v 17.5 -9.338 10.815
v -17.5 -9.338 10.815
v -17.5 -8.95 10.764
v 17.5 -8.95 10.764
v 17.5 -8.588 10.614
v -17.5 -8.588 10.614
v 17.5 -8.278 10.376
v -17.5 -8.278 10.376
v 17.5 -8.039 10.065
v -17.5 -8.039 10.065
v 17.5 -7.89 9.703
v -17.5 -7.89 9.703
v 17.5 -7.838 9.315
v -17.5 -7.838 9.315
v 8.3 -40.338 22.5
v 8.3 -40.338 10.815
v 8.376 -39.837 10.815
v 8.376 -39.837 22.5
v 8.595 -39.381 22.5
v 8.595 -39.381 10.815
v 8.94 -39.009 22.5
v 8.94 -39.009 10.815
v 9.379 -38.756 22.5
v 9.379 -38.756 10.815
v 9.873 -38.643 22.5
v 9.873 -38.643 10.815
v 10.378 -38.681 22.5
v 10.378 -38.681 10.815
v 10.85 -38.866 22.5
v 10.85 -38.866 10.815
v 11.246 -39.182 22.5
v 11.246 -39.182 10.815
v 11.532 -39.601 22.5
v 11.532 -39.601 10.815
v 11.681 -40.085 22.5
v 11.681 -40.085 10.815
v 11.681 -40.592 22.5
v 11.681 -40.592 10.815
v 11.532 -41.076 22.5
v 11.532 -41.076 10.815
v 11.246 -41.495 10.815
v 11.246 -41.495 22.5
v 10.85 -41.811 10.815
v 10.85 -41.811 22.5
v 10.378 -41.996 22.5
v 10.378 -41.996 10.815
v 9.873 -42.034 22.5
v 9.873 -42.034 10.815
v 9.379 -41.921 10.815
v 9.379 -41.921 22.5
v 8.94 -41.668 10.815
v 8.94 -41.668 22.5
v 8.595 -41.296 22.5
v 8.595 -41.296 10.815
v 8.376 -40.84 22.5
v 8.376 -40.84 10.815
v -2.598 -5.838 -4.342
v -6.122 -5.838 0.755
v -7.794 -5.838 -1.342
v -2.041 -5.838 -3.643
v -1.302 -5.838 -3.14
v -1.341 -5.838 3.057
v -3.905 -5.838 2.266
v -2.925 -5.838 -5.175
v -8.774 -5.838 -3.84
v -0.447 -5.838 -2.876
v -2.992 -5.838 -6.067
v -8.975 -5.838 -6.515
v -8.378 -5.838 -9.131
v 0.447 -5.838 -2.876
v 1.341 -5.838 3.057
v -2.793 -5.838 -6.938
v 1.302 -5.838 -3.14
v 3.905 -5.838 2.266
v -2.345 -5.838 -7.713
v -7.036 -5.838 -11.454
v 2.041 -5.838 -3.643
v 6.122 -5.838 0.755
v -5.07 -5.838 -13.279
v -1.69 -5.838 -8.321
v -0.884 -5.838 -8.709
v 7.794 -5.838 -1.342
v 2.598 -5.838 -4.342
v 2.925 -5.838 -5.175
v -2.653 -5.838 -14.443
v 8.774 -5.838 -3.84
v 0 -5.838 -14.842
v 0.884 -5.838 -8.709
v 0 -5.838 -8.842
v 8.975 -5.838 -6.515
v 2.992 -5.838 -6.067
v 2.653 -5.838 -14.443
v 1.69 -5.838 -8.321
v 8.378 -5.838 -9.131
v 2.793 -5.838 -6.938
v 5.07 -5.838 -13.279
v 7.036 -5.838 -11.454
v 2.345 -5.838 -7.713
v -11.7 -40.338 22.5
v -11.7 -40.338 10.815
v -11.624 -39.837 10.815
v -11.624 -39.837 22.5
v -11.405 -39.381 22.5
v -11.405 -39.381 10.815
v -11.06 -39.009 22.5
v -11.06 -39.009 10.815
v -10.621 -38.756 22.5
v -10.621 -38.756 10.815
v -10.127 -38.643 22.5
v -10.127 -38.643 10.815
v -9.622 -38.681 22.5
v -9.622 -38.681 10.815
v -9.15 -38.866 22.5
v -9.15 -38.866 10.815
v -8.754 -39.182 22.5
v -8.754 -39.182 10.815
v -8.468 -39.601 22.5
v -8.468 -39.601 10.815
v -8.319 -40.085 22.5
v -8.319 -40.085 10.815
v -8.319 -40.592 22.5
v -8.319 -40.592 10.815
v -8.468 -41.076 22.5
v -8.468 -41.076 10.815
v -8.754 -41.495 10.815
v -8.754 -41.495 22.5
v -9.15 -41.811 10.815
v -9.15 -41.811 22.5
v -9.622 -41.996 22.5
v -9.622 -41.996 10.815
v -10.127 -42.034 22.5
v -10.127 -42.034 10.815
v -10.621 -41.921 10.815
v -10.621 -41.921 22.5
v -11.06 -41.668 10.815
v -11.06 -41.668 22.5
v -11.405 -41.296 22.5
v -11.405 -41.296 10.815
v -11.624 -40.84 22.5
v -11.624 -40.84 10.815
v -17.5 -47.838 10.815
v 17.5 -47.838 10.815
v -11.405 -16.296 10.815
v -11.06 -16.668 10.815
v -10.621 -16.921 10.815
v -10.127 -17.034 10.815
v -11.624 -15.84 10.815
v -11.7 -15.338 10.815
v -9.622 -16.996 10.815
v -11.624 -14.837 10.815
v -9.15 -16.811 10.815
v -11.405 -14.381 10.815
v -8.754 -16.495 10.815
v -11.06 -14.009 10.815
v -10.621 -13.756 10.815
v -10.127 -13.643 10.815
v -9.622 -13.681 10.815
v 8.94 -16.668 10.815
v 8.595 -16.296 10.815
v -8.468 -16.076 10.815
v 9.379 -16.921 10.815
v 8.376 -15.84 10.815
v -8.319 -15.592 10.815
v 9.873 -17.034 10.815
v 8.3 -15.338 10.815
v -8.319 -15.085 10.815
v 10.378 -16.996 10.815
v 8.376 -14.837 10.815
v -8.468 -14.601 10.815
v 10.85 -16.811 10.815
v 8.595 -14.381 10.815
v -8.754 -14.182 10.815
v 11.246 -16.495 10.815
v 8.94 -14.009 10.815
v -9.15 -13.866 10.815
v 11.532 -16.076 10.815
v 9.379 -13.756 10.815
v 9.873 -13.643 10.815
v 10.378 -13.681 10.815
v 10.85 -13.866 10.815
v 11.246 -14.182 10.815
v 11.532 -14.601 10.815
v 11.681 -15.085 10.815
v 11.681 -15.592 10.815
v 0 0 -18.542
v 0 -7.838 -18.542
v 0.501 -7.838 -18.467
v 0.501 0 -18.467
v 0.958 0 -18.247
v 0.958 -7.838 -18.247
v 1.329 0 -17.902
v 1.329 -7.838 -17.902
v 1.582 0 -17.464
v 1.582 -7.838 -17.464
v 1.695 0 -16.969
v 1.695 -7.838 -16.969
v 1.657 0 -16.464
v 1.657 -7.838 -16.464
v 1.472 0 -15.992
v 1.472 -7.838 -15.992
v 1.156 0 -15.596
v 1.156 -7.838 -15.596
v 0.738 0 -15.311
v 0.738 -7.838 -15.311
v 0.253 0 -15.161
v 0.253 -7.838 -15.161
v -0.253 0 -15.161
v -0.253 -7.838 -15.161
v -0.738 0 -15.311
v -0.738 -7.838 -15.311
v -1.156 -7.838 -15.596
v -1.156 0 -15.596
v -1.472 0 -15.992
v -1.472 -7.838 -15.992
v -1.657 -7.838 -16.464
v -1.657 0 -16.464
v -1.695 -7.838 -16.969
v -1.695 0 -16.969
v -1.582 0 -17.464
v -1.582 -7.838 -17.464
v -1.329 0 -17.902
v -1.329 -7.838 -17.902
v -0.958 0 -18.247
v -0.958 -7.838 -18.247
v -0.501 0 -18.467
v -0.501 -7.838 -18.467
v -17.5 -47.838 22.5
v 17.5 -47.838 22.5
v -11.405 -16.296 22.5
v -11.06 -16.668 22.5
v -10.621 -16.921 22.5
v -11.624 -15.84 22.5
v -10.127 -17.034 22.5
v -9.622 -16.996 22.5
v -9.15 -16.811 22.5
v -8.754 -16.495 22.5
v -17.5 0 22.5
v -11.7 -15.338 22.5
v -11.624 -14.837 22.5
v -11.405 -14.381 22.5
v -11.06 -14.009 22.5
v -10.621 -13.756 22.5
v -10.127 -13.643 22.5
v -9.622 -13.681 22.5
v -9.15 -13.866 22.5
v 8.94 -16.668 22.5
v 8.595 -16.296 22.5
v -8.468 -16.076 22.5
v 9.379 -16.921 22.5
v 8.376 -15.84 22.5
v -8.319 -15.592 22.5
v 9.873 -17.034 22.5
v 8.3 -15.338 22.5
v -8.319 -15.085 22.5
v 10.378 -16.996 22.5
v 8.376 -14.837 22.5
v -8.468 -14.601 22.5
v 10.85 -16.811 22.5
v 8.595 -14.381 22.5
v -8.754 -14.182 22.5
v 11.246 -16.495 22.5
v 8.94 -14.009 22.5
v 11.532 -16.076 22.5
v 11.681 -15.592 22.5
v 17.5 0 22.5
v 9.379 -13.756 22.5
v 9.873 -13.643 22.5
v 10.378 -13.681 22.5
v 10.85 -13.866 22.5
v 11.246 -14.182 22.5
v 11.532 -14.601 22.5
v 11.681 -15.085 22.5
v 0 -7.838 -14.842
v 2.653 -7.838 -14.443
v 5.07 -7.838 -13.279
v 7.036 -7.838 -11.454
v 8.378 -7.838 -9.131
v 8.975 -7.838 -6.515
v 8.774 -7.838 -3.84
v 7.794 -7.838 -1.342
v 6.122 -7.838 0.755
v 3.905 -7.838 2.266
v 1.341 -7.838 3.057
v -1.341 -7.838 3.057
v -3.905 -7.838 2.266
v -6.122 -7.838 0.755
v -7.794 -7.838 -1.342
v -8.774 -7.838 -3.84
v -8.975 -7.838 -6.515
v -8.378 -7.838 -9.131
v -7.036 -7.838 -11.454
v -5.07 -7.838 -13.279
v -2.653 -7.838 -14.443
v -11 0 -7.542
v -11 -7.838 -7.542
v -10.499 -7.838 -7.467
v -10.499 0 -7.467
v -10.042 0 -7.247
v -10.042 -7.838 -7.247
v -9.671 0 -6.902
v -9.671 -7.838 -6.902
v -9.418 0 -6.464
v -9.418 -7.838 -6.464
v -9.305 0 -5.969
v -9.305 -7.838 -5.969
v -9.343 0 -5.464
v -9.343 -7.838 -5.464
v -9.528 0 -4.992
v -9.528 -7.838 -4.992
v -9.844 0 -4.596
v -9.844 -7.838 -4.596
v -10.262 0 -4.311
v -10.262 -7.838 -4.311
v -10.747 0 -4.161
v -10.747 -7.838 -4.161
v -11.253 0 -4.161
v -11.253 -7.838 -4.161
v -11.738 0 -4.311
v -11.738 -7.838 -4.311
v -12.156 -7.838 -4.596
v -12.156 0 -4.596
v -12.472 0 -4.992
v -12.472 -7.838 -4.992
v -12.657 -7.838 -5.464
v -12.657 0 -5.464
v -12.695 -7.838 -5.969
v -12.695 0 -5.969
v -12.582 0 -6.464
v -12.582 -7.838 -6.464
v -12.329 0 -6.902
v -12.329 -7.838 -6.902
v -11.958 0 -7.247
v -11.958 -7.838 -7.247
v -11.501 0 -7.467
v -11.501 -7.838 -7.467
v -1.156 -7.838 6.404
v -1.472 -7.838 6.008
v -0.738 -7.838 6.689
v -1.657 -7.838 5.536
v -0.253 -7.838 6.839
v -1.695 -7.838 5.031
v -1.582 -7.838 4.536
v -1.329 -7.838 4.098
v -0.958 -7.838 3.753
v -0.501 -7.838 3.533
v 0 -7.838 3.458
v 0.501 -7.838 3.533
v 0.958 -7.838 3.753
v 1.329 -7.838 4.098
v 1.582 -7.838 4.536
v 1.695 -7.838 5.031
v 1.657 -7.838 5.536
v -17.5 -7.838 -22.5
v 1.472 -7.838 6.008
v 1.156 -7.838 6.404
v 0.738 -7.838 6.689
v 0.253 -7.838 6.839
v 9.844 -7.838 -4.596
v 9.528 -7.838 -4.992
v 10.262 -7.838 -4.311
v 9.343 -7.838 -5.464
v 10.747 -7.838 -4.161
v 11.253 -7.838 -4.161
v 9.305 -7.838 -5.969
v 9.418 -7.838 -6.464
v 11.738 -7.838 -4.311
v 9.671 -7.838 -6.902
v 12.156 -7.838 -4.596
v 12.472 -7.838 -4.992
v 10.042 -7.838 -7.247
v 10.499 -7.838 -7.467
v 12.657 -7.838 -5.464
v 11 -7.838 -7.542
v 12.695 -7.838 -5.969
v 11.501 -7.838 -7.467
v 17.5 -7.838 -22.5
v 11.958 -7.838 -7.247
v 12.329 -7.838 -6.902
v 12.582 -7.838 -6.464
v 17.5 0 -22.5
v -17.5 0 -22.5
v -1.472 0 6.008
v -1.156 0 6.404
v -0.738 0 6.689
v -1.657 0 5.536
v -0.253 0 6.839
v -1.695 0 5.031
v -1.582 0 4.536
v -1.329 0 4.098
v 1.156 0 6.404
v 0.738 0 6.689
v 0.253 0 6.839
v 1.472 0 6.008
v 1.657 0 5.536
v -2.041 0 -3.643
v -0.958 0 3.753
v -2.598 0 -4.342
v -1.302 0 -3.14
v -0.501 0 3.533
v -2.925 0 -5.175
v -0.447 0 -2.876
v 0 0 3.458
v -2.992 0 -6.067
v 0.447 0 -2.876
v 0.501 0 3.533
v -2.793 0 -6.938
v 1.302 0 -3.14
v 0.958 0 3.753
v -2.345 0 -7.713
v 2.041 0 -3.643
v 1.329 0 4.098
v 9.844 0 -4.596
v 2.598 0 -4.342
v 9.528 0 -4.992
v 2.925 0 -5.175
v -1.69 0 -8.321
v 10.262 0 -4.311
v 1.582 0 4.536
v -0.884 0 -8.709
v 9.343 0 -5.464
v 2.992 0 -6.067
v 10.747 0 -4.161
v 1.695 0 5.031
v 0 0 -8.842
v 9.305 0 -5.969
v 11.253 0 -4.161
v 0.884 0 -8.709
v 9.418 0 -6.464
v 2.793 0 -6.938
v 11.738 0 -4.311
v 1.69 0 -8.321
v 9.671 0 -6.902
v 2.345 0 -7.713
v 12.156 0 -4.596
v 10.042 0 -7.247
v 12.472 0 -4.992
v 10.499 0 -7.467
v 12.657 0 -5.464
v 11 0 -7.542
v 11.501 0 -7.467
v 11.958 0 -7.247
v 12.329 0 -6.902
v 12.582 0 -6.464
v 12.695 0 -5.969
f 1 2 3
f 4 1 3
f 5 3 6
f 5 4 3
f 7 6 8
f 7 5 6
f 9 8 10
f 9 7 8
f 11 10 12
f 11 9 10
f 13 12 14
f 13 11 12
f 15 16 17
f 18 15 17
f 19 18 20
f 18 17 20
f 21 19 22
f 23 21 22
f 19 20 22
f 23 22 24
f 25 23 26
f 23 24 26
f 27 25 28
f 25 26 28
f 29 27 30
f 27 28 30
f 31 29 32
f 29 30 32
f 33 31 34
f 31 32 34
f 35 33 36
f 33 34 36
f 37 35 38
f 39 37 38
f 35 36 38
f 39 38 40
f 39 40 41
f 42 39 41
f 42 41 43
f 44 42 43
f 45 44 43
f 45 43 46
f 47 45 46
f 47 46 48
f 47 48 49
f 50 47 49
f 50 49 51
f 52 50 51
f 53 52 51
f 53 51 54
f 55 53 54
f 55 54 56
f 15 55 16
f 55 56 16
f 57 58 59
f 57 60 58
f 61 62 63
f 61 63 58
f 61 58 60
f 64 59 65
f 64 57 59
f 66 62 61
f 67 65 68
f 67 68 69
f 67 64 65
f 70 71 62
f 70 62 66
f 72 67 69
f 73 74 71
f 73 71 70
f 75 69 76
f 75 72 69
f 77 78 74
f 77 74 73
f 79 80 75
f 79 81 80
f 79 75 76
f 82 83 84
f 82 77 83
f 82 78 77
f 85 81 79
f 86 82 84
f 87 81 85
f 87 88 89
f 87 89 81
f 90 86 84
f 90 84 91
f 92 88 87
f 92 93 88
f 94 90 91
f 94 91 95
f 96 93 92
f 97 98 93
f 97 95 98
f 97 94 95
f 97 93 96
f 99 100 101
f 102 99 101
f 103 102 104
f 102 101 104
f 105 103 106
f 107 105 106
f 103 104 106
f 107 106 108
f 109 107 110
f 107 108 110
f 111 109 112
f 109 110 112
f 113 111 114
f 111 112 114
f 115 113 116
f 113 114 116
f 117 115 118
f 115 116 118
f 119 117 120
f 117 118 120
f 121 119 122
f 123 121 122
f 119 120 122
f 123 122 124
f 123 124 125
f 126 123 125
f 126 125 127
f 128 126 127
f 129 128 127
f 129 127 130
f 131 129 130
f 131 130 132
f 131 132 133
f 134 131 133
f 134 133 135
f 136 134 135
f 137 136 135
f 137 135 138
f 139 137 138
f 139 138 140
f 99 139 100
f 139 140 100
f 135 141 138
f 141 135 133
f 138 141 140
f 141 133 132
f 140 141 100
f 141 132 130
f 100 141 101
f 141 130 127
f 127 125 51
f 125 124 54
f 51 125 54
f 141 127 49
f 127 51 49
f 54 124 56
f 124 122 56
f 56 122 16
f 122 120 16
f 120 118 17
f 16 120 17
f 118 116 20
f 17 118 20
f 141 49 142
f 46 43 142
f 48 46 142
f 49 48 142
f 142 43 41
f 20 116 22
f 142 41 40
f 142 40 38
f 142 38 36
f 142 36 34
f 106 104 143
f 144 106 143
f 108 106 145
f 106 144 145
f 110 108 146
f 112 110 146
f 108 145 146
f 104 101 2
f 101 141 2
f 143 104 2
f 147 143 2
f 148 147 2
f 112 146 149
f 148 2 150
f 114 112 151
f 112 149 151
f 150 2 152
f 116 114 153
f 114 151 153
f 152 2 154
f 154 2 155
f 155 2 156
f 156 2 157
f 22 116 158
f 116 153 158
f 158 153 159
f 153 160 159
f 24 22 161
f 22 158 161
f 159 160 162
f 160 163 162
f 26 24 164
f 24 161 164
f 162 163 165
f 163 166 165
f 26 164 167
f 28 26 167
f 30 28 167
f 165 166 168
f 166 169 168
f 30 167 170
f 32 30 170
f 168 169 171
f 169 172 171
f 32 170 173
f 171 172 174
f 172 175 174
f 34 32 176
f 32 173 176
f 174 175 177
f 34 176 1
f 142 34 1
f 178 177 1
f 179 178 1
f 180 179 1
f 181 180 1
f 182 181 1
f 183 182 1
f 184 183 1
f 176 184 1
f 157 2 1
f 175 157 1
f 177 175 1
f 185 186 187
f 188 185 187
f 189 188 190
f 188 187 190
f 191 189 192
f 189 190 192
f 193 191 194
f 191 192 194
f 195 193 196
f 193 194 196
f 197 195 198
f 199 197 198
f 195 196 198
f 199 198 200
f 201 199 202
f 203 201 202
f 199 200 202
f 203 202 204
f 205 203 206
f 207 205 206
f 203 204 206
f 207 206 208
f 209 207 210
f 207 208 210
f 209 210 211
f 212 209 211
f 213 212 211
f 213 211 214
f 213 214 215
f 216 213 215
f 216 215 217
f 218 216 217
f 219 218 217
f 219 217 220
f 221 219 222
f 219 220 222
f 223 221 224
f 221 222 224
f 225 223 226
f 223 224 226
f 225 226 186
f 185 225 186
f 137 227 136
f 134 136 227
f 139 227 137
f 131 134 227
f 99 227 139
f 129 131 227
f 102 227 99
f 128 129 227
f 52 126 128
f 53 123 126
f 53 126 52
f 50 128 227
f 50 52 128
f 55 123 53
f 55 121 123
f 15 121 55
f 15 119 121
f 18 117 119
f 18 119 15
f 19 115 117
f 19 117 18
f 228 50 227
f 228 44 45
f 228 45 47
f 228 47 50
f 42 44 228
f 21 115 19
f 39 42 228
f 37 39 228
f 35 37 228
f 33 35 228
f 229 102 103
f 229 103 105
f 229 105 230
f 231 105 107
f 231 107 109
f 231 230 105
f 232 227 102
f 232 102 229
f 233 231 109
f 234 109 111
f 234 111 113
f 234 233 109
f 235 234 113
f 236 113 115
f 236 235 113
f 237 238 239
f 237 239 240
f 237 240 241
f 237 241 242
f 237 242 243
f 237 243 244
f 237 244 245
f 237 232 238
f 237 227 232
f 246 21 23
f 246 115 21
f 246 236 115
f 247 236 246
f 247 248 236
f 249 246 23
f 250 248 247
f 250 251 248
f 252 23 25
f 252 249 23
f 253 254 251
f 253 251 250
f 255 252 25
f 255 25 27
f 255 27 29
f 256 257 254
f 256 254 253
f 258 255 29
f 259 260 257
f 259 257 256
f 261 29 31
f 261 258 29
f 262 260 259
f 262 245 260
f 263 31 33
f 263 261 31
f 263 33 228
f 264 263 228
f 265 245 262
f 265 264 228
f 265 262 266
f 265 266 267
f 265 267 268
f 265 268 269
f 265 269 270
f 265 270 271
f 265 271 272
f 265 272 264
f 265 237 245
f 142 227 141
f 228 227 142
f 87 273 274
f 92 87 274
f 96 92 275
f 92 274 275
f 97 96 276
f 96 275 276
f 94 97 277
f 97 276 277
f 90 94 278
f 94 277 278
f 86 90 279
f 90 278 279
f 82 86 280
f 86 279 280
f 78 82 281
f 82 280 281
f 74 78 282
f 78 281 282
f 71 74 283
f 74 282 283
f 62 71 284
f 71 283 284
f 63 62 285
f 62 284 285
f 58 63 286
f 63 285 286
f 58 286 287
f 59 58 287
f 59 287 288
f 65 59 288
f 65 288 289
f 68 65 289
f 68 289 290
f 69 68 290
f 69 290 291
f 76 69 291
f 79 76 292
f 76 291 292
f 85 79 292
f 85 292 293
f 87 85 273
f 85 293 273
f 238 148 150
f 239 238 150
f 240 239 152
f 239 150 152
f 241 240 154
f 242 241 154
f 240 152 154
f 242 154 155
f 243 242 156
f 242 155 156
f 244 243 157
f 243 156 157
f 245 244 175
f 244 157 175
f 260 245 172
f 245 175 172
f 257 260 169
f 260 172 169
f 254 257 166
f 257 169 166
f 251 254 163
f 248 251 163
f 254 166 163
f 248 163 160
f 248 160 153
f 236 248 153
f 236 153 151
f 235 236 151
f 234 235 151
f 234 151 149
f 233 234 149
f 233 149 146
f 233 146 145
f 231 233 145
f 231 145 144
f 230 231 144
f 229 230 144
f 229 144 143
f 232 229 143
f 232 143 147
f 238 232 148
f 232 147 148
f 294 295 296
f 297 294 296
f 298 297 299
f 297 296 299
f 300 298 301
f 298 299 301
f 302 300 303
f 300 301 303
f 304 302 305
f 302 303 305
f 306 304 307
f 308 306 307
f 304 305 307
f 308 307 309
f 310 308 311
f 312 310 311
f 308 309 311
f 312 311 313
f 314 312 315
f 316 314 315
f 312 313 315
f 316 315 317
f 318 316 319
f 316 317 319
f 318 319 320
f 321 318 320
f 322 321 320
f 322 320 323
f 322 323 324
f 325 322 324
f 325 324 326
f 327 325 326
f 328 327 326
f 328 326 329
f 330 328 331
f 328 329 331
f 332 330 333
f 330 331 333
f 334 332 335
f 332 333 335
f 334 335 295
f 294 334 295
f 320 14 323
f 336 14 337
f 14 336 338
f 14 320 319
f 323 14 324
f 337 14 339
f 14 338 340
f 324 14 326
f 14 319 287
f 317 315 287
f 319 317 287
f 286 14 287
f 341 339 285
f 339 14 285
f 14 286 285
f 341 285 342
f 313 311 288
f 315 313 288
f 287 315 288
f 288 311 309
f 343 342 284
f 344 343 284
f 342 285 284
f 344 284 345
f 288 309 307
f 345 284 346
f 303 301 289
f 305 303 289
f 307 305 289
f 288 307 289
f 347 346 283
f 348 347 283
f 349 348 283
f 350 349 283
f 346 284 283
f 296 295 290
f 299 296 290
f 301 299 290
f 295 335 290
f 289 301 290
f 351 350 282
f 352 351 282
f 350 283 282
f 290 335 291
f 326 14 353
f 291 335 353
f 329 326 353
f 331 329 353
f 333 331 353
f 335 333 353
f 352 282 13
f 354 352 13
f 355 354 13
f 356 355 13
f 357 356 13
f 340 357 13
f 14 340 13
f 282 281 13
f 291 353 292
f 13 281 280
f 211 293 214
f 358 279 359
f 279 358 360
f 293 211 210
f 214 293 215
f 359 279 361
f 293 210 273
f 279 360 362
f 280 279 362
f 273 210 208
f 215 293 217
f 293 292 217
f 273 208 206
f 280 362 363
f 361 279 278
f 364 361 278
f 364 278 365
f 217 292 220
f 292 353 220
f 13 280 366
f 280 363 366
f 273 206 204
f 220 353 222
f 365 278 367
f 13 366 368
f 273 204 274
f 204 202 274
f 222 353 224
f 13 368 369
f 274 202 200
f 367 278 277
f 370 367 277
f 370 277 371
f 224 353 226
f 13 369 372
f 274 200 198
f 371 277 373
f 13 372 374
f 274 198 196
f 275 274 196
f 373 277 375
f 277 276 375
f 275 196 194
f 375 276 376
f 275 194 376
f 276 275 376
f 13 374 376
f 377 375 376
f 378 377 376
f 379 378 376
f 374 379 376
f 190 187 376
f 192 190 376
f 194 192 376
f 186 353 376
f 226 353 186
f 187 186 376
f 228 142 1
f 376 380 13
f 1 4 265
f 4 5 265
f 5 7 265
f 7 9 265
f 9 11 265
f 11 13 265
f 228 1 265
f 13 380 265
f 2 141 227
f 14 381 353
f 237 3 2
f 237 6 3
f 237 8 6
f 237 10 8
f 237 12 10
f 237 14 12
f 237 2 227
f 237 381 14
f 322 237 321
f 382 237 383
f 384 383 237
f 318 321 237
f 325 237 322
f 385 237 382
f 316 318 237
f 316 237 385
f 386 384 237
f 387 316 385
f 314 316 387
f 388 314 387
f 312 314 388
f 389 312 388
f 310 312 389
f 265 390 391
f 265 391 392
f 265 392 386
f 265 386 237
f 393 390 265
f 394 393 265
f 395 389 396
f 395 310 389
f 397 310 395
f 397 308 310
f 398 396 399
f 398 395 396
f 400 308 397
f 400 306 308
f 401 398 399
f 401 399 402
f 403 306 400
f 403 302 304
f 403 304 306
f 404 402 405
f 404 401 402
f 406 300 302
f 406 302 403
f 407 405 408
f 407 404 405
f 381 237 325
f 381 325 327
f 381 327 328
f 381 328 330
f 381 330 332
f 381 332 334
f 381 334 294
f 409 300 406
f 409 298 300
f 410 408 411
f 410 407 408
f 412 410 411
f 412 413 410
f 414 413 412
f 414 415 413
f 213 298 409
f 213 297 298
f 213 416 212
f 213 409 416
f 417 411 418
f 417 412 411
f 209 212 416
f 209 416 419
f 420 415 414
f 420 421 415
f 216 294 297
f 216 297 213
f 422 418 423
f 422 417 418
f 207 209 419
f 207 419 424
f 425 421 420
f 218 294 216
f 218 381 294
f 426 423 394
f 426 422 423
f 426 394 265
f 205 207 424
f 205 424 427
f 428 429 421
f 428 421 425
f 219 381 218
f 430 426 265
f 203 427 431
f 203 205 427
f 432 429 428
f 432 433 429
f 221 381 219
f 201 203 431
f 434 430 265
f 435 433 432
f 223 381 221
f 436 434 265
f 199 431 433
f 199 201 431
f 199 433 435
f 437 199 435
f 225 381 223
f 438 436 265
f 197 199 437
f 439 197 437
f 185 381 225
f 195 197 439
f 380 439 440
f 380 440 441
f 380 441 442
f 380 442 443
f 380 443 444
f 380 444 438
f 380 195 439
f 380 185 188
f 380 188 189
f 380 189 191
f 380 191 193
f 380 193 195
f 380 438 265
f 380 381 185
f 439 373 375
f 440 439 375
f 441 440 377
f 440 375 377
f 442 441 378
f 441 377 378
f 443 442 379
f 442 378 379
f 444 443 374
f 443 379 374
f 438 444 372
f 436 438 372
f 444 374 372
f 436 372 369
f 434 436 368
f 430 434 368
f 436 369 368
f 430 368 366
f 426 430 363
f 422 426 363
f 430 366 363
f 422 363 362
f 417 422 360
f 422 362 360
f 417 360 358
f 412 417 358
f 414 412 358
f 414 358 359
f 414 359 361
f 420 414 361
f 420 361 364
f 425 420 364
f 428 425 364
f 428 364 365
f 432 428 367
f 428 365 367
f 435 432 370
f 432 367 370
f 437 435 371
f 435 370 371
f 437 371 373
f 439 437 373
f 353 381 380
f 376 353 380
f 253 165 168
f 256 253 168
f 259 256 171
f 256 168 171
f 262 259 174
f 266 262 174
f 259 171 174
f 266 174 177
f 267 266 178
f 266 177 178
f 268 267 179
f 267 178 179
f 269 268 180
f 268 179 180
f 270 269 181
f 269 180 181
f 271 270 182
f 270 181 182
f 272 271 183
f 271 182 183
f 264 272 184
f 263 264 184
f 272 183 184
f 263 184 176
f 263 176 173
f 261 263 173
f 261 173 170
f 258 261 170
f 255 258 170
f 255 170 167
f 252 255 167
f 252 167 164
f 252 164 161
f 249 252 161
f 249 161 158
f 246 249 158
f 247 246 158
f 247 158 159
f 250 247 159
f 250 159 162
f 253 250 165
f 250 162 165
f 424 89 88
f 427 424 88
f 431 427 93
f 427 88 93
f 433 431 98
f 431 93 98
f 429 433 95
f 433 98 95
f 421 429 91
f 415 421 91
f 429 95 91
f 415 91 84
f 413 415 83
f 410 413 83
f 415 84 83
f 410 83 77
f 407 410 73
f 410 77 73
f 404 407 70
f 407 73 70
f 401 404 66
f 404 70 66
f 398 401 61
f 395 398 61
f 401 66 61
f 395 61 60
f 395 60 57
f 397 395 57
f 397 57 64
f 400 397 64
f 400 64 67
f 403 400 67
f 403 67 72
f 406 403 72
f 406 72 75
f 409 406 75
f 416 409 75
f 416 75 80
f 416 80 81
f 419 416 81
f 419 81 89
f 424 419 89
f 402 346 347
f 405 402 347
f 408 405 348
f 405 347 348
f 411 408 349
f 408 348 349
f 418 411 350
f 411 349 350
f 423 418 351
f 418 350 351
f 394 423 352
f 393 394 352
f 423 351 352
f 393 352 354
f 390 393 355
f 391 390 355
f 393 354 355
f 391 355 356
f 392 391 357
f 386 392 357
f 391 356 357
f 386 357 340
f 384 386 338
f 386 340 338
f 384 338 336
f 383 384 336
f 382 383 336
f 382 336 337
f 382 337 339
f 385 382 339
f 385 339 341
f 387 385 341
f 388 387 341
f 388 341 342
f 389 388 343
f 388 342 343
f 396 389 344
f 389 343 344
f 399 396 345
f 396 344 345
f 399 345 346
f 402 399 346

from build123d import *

# Parameters (mm, degrees)
SKETCH1_W           = 35
SKETCH1_H           = 45
BOSS_EXTRUDE1_DEPTH = 7.838444594
SKETCH2_W           = 35
SKETCH2_H           = 11.6848633
BOSS_EXTRUDE2_DEPTH = 40
SKETCH3_R           = 9
CUT_EXTRUDE1_DEPTH  = 2
SKETCH4_R           = 3
SKETCH4_R_2         = 1.7
CUT_EXTRUDE2_DEPTH  = 7.838444594
SKETCH5_R           = 1.7
CUT_EXTRUDE3_DEPTH  = 11.6848633
FILLET1_R           = 1.5


with BuildPart() as part:
    # Sketch1 → Boss-Extrude1 (new body)
    with BuildSketch(Plane(origin=(0, 0, 0), x_dir=(1, 0, 0), z_dir=(0, 1, 0))):
        Rectangle(SKETCH1_W, SKETCH1_H)
    extrude(amount=-BOSS_EXTRUDE1_DEPTH)

    # Sketch2 → Boss-Extrude2 (add)
    with BuildSketch(Plane.XZ.offset(7.838444594)):
        with Locations((0, 16.65756835)):
            Rectangle(SKETCH2_W, SKETCH2_H)
    extrude(amount=BOSS_EXTRUDE2_DEPTH)

    # Sketch3 → Cut-Extrude1 (cut)
    with BuildSketch(Plane.XZ.offset(7.838444594)):
        with Locations(Location((0, -5.84243165, 0), (0, 0, 270))):
            Circle(SKETCH3_R)
    extrude(amount=-CUT_EXTRUDE1_DEPTH, mode=Mode.SUBTRACT)

    # Sketch4 → Cut-Extrude2 (cut)
    with BuildSketch(Plane.XZ.offset(7.838444594)):
        with Locations(Location((0, -5.84243165, 0), (0, 0, 270))):
            Circle(SKETCH4_R)
        with Locations(Location((0, 5.15756835, 0), (0, 0, 270))):
            Circle(SKETCH4_R_2)
        with Locations(Location((11, -5.84243165, 0), (0, 0, 270))):
            Circle(SKETCH4_R_2)
        with Locations(Location((0, -16.84243165, 0), (0, 0, 270))):
            Circle(SKETCH4_R_2)
        with Locations(Location((-11, -5.84243165, 0), (0, 0, 270))):
            Circle(SKETCH4_R_2)
    extrude(amount=-CUT_EXTRUDE2_DEPTH, mode=Mode.SUBTRACT)

    # Sketch5 → Cut-Extrude3 (cut)
    with BuildSketch(Plane(origin=(0, 0, 10.8151367), x_dir=(-1, 0, 0), z_dir=(0, 0, -1))):
        with Locations((-10, -40.338444594)):
            Circle(SKETCH5_R)
        with Locations((10, -40.338444594)):
            Circle(SKETCH5_R)
        with Locations((-10, -15.338444594)):
            Circle(SKETCH5_R)
        with Locations((10, -15.338444594)):
            Circle(SKETCH5_R)
    extrude(amount=-CUT_EXTRUDE3_DEPTH, mode=Mode.SUBTRACT)

    # Fillet1
    fillet1_edges = [part.edges().sort_by_distance(p)[0] for p in [
        (0, -7.838444594, 10.8151367),
    ]]
    fillet(fillet1_edges, radius=FILLET1_R)


solid = part.part
